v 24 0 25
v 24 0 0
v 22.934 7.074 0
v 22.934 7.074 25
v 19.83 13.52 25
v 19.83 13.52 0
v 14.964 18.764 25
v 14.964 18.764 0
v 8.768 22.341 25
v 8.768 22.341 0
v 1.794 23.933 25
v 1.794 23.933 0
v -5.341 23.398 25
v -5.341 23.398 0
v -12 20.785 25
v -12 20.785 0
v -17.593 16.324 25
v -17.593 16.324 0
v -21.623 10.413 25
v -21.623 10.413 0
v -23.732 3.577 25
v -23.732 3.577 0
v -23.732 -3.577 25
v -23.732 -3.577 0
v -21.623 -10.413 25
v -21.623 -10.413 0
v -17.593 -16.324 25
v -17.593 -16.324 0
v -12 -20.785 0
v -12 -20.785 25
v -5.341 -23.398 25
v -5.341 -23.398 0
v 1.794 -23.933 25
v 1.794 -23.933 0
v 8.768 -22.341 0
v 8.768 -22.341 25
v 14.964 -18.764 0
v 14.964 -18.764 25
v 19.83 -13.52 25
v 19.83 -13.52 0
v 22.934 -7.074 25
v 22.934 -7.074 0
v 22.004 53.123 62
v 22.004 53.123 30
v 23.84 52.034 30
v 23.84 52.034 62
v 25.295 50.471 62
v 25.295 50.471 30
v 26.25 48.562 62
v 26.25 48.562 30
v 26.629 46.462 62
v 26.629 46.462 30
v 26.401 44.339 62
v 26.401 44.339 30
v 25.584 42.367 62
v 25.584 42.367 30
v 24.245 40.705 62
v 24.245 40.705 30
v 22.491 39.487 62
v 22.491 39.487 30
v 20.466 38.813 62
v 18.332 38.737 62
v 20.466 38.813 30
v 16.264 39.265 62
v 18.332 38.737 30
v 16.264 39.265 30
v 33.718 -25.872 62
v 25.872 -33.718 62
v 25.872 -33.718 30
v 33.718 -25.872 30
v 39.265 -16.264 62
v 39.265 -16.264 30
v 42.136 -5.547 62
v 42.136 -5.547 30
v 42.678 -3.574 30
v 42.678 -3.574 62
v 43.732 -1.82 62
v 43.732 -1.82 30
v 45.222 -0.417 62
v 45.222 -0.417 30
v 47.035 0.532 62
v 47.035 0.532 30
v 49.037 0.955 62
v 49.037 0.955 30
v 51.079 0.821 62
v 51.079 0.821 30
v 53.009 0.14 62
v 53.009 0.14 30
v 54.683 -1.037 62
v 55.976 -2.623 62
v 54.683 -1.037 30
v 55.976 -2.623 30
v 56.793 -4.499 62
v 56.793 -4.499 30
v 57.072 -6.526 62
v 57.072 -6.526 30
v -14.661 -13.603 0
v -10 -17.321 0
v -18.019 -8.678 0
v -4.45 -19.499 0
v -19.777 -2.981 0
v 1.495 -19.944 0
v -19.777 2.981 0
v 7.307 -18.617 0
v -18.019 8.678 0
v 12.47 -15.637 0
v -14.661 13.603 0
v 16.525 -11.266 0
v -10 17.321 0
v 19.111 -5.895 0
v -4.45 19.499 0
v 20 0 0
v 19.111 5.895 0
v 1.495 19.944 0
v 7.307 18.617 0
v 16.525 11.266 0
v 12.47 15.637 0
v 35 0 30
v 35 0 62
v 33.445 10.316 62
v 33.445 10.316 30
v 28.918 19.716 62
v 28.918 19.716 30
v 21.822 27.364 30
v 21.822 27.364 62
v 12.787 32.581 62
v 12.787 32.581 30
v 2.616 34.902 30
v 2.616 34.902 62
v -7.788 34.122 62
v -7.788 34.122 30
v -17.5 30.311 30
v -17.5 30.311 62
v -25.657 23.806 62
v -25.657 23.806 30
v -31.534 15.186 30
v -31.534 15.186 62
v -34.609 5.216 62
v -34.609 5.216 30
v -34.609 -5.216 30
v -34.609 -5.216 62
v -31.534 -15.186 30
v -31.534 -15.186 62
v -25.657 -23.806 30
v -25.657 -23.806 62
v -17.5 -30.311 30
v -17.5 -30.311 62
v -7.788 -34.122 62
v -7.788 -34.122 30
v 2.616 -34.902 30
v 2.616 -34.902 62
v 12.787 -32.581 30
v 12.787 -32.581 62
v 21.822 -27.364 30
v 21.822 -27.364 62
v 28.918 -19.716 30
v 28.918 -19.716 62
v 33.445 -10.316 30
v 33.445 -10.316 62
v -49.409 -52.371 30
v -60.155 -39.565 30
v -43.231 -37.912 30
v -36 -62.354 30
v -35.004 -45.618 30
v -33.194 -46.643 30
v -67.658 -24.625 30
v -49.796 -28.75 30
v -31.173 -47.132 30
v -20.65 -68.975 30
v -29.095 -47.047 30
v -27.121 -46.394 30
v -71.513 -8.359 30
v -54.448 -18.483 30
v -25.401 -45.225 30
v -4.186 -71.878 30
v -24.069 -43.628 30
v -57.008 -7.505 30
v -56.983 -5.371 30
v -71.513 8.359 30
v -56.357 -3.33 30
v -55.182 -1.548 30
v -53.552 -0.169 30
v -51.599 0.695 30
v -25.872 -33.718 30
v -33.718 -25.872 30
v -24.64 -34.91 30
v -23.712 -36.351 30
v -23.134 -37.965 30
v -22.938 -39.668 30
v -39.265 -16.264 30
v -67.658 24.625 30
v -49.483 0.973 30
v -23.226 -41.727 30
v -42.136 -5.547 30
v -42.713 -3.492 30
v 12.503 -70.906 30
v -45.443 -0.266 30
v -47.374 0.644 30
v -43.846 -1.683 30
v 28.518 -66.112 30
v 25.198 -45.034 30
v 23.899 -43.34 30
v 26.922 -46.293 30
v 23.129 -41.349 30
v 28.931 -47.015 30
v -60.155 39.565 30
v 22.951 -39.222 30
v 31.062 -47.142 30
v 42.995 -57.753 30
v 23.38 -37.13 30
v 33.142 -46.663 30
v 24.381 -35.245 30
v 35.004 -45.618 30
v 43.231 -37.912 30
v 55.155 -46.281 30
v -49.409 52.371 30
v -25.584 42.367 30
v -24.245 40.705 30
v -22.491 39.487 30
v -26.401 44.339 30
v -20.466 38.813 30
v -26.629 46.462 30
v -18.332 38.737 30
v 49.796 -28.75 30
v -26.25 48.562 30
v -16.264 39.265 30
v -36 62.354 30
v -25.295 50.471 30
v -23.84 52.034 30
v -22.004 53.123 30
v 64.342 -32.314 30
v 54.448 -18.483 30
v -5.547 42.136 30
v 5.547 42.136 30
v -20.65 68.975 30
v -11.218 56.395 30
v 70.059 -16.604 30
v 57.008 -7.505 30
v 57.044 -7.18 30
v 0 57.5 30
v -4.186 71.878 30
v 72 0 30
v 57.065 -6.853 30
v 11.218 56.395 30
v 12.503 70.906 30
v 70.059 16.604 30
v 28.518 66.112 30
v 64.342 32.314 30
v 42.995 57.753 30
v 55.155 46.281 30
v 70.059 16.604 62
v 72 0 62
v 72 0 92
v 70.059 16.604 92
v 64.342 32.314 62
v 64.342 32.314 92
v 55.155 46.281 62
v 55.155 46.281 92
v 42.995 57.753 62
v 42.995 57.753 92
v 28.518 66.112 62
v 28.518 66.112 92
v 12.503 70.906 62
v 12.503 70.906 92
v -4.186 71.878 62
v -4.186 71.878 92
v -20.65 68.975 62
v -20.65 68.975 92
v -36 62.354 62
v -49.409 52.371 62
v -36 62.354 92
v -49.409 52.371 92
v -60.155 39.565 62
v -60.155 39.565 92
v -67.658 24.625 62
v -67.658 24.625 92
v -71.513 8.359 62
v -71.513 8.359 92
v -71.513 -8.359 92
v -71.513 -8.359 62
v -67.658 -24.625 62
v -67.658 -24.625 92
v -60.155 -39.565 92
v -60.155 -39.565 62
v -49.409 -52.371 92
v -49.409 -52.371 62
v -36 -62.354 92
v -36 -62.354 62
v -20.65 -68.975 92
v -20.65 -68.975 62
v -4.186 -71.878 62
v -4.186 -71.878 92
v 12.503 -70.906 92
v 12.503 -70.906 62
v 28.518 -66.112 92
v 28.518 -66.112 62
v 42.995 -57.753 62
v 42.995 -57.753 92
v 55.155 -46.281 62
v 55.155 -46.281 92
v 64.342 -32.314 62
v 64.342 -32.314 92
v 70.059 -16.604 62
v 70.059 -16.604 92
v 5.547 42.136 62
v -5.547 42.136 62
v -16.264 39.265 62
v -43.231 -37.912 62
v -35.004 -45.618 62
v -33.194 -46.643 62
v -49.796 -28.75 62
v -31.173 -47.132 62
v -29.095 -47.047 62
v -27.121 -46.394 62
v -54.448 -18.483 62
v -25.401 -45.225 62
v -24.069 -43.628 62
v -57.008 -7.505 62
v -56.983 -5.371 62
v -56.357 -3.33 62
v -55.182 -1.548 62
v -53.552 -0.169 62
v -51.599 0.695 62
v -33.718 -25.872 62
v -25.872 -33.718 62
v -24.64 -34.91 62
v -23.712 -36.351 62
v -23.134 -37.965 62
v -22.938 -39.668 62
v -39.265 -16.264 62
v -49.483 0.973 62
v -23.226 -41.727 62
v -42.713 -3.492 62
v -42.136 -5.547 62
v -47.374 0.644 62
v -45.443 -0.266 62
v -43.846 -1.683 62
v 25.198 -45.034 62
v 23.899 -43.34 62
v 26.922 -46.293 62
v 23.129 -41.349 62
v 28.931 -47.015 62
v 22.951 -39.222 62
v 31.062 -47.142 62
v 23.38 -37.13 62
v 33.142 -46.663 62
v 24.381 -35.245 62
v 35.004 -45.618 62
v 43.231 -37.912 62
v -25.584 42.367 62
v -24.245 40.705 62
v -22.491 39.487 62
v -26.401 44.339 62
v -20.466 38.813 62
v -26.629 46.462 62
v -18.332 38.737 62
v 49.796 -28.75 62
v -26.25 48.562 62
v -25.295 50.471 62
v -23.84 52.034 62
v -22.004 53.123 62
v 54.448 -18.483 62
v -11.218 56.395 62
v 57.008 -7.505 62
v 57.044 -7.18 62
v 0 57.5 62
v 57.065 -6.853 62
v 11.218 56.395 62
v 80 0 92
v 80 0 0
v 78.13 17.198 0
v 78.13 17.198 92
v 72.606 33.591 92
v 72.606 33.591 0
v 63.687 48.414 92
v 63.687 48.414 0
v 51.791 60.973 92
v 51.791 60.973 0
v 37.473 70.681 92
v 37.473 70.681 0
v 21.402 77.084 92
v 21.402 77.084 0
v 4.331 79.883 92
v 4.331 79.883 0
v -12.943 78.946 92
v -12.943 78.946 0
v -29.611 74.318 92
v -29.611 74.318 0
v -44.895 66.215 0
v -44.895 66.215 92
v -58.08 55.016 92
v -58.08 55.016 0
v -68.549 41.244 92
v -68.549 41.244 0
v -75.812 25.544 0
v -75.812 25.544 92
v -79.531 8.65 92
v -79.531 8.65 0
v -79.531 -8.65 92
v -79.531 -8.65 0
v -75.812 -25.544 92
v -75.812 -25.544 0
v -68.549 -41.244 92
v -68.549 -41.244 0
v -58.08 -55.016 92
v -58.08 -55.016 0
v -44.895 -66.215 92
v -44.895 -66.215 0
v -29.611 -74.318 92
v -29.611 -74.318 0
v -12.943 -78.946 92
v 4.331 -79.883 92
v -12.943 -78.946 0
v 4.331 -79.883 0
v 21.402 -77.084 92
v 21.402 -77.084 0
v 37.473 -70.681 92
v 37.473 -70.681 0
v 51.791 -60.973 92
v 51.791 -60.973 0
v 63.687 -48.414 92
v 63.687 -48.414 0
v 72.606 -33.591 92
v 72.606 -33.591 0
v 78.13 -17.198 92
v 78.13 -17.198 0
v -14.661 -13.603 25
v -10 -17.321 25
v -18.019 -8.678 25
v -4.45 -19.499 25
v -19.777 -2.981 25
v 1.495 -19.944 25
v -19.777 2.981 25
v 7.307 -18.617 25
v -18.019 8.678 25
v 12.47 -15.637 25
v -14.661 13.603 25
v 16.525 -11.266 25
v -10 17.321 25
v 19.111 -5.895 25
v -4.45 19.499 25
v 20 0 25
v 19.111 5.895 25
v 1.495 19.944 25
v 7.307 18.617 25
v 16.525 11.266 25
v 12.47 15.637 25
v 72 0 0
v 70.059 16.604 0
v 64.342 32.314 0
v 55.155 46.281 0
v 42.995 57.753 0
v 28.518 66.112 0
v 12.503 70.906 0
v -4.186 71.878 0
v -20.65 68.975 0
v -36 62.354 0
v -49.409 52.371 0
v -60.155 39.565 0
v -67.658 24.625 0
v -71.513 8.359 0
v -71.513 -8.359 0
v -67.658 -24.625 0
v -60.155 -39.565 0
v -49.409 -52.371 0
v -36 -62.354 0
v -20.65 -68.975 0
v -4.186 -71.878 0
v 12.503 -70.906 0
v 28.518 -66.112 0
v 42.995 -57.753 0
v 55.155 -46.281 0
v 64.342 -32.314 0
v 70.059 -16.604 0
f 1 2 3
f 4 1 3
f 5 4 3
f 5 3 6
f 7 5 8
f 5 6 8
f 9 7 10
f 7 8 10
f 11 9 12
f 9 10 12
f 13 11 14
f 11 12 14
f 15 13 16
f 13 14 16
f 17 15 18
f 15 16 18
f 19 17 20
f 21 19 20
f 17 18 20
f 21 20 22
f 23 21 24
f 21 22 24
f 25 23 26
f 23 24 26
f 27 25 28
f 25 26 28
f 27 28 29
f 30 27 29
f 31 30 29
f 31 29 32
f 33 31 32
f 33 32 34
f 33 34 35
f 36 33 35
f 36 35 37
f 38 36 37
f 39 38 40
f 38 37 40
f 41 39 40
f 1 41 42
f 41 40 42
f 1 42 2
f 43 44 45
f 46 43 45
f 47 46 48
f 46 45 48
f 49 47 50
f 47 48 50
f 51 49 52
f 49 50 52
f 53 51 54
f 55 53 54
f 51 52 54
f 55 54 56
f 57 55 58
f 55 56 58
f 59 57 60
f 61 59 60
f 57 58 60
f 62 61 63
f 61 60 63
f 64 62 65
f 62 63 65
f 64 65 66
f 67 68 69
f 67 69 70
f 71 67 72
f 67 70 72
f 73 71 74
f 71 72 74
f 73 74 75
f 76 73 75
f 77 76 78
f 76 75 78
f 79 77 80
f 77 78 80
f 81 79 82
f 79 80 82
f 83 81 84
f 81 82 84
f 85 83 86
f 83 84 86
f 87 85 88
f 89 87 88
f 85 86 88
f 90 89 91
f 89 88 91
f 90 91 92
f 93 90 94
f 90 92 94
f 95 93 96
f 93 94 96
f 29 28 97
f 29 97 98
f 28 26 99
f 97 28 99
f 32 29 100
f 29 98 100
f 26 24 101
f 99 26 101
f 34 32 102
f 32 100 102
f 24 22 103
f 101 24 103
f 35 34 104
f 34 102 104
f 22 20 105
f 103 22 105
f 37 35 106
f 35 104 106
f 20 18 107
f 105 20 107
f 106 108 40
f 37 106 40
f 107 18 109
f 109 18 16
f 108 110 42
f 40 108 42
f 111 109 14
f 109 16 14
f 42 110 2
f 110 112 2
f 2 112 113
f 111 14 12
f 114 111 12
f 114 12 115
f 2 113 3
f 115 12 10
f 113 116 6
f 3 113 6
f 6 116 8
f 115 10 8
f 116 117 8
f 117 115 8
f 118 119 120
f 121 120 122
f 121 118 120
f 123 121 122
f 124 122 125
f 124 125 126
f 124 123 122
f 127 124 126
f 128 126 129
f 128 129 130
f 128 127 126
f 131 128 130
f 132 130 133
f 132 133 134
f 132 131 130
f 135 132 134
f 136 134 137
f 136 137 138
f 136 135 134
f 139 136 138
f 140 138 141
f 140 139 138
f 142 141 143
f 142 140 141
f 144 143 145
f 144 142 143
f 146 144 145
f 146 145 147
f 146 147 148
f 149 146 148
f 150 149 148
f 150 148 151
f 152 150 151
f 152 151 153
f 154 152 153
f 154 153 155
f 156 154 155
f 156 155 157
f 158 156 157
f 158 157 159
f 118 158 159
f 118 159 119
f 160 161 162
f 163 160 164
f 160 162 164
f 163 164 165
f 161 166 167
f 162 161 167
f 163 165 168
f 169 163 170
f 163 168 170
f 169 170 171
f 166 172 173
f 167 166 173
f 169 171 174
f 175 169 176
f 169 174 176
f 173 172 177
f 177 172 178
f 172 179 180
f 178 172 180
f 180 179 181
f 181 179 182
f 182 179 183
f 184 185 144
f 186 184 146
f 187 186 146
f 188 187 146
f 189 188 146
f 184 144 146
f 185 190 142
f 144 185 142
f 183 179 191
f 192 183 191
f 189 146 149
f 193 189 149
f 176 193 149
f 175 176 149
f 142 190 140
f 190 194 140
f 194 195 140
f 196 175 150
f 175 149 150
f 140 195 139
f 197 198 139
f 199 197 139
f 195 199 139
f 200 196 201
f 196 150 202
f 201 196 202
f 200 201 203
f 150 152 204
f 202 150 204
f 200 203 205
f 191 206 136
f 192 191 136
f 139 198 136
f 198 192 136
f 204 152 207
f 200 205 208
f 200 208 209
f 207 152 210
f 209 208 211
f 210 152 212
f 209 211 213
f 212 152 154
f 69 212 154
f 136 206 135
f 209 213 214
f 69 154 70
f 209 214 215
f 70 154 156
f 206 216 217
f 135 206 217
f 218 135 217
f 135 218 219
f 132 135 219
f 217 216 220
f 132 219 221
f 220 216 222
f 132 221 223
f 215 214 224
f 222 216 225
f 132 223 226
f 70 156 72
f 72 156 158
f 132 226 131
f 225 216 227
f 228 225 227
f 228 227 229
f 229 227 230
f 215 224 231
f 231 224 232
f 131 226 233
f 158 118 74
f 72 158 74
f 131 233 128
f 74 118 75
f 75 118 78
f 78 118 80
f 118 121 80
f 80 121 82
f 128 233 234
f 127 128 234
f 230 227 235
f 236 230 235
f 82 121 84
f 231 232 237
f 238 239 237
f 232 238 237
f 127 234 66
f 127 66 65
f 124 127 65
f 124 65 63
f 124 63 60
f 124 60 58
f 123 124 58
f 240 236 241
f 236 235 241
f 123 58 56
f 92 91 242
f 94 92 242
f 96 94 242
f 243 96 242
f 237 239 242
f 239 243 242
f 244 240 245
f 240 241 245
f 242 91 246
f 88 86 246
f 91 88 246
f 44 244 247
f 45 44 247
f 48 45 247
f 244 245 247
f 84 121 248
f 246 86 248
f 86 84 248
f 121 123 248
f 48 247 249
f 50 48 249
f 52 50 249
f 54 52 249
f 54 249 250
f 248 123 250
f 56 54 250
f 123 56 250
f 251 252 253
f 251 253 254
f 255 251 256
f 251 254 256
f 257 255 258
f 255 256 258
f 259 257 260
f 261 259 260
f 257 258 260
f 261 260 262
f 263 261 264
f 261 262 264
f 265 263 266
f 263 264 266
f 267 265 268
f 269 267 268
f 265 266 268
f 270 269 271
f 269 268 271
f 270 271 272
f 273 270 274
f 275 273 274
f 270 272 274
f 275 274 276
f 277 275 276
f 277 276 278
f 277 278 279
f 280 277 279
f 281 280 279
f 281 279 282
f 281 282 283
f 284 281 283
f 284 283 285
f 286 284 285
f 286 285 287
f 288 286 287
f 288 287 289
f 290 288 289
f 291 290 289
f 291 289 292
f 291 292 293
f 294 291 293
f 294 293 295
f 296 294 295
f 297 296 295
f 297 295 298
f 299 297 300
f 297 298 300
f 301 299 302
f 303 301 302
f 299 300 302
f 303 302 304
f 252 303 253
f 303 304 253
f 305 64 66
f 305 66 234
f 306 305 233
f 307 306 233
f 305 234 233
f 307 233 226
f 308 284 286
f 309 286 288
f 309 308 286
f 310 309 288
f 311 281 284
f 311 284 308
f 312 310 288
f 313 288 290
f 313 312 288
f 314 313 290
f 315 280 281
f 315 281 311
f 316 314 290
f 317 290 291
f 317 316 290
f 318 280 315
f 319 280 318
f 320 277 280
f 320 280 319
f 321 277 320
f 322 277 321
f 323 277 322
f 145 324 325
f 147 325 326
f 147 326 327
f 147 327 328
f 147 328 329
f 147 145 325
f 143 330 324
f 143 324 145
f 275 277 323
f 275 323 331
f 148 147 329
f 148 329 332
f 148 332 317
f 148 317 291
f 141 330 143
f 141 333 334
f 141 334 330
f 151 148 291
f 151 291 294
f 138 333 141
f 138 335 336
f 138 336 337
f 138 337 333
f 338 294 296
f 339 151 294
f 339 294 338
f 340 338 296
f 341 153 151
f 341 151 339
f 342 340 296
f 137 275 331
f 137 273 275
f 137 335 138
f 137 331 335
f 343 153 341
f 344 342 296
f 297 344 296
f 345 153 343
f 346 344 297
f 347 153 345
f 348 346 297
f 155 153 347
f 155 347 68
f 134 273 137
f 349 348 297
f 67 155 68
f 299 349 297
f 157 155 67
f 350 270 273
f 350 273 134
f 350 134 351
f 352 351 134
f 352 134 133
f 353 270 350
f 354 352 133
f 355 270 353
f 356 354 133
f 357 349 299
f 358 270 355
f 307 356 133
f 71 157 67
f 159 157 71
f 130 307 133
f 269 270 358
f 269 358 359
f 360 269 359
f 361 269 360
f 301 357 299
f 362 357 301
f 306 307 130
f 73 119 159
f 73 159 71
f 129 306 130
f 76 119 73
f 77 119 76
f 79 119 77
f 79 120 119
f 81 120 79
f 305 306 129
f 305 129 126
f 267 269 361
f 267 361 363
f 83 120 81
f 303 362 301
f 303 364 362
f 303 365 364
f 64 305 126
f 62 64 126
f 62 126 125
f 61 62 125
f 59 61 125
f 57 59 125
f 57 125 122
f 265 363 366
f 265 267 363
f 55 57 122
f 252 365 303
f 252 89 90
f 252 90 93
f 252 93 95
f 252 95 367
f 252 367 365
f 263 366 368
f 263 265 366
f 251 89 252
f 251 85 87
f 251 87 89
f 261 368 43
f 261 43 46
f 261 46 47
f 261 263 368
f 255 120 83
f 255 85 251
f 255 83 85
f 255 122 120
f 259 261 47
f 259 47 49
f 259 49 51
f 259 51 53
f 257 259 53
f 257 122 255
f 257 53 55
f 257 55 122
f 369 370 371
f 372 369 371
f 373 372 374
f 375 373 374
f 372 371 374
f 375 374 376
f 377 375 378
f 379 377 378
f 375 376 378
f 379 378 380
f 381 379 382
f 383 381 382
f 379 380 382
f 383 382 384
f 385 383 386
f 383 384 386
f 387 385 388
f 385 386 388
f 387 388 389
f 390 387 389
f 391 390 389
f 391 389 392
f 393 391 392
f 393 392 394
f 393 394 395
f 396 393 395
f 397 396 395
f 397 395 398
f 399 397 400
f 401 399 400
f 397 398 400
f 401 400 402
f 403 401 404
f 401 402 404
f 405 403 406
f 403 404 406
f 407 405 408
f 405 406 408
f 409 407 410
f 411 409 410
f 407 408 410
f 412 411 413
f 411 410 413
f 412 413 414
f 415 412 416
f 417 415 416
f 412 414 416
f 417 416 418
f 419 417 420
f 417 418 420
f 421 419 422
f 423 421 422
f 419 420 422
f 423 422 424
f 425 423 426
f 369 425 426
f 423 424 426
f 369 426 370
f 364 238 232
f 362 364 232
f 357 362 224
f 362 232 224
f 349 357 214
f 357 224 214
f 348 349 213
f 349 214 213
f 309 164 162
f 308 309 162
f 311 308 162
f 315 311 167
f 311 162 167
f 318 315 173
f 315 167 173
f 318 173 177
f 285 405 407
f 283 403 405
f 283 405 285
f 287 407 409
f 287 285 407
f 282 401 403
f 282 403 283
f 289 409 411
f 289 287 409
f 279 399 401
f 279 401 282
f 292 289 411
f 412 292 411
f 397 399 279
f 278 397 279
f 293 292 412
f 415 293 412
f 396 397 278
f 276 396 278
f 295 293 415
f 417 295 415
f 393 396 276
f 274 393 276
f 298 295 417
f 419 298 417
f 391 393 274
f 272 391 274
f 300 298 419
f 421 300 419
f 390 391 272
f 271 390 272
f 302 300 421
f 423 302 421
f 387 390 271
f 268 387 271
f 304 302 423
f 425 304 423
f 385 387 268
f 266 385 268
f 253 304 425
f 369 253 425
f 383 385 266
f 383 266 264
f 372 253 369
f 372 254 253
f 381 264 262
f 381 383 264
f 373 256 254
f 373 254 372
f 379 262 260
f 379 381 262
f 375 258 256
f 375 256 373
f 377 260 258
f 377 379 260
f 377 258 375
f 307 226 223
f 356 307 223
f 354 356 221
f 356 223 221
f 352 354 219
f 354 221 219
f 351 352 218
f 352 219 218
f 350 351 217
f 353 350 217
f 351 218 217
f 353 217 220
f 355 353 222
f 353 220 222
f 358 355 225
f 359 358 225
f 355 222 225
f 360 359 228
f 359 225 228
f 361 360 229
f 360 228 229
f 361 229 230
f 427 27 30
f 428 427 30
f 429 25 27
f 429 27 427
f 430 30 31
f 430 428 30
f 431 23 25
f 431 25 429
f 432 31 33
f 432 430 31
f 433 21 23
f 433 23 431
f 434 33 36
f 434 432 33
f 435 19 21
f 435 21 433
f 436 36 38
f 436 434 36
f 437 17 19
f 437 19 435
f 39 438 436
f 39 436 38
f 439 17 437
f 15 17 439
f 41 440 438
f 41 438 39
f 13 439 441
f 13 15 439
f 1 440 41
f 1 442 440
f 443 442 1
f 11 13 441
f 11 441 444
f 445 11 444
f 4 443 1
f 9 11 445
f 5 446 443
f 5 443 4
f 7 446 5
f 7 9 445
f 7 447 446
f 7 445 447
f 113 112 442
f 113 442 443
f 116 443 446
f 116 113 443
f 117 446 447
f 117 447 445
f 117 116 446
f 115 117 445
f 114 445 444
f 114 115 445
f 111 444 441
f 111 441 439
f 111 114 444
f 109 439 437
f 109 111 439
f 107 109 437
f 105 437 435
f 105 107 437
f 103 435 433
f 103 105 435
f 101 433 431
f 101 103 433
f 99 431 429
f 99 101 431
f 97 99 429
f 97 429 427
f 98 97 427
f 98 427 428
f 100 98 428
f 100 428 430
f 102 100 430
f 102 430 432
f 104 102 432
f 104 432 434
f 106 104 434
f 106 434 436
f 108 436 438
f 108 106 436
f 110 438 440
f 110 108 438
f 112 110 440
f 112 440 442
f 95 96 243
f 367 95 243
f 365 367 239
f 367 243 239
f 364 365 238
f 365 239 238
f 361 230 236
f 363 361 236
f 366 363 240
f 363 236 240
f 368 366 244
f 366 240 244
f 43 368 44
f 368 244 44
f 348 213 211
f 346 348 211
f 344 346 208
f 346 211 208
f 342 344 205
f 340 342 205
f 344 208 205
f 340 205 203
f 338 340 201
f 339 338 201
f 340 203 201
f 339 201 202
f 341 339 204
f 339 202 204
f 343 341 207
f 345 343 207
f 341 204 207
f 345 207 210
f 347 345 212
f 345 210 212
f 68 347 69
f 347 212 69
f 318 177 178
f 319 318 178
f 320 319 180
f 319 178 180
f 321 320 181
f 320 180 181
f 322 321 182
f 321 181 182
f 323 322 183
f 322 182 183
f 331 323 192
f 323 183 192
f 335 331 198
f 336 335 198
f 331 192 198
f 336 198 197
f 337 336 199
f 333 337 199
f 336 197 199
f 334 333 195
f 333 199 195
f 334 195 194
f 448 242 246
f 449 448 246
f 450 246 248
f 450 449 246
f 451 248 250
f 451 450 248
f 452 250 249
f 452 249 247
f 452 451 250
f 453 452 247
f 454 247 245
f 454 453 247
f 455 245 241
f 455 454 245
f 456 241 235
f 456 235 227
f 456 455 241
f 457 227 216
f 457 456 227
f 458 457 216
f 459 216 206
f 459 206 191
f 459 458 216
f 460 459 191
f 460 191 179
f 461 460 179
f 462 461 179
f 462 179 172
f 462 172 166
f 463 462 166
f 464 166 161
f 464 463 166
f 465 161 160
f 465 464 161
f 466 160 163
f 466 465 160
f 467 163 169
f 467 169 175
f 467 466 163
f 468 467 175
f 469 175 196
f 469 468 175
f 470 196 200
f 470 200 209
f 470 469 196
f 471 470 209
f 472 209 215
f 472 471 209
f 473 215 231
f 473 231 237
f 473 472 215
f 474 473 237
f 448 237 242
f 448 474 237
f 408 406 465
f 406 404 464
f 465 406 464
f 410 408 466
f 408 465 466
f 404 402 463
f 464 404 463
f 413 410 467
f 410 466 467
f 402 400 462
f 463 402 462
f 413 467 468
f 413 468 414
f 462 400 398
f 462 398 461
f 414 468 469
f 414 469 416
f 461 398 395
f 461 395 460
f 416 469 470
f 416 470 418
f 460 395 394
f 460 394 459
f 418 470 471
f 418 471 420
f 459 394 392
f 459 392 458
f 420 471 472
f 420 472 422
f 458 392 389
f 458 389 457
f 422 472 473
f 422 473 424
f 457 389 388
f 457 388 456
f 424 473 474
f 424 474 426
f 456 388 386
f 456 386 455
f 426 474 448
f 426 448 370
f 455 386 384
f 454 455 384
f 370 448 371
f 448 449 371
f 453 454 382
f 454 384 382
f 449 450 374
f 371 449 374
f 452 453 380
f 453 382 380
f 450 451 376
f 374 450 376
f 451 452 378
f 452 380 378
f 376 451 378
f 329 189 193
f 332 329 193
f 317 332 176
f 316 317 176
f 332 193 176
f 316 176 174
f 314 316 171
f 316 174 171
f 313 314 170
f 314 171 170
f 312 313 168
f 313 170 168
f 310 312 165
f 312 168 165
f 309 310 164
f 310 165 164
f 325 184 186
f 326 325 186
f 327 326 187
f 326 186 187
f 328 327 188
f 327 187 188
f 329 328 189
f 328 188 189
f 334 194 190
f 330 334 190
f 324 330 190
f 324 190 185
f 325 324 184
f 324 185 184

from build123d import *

# Parameters (mm, degrees)
F0_R      = 80
F0_R_2    = 72
F1_DEPTH  = 92
F0_R_3    = 35
F2_DEPTH  = 92
F3_DEPTH  = 30
F4_R      = 72
F4_R_2    = 35
F5_DEPTH  = 30
F6_R      = 72
F6_R_2    = 35
F7_DEPTH  = 25
F8_DEPTH  = 30
F9_R      = 24
F9_R_2    = 20
F10_DEPTH = 25


with BuildPart() as f1:
    # F0 (on Top) → F1 (new body)
    with BuildSketch(Plane.XY):
        Circle(F0_R)
        Circle(F0_R_2, mode=Mode.SUBTRACT)
    extrude(amount=F1_DEPTH)

    # F0 (on Top) → F2 (join)
    with BuildSketch(Plane.XY):
        Circle(F0_R)
        Circle(F0_R_2, mode=Mode.SUBTRACT)
        Circle(F0_R_2)
        with BuildLine():
            ThreePointArc((-25.872361, -33.717517), (-23.711526, -36.350502), (-22.938071, -39.667667))
            ThreePointArc((-22.938071, -39.667667), (-27.120906, -46.394213), (-35.003782, -45.617817))
            ThreePointArc((-35.003782, -45.617817), (-49.796461, -28.75), (-57.00808, -7.505256))
            ThreePointArc((-57.00808, -7.505256), (-50.55119, 0.909527), (-42.136407, -5.547363))
            ThreePointArc((-42.136407, -5.547363), (-36.80608, -21.25), (-25.872361, -33.717517))
        make_face(mode=Mode.SUBTRACT)
        with BuildLine():
            ThreePointArc((42.136407, -5.547363), (50.062767, 0.957632), (57.072243, -6.52631))
            ThreePointArc((57.072243, -6.52631), (57.056185, -7.016833), (57.00808, -7.505256))
            ThreePointArc((57.00808, -7.505256), (49.796461, -28.75), (35.003782, -45.617817))
            ThreePointArc((35.003782, -45.617817), (24.487921, -44.233378), (25.872361, -33.717517))
            ThreePointArc((25.872361, -33.717517), (36.80608, -21.25), (42.136407, -5.547363))
        make_face(mode=Mode.SUBTRACT)
        with BuildLine():
            ThreePointArc((-16.264046, 39.26488), (-26.063268, 43.323851), (-22.004297, 53.123073))
            ThreePointArc((-22.004297, 53.123073), (0, 57.5), (22.004297, 53.123073))
            ThreePointArc((22.004297, 53.123073), (26.063268, 43.323851), (16.264046, 39.26488))
            ThreePointArc((16.264046, 39.26488), (0, 42.5), (-16.264046, 39.26488))
        make_face(mode=Mode.SUBTRACT)
        Circle(F0_R_3, mode=Mode.SUBTRACT)
    extrude(amount=F2_DEPTH)

    # F0 (on Top) → F3 (cut)
    with BuildSketch(Plane.XY):
        Circle(F0_R_2)
        with BuildLine():
            ThreePointArc((-25.872361, -33.717517), (-23.711526, -36.350502), (-22.938071, -39.667667))
            ThreePointArc((-22.938071, -39.667667), (-27.120906, -46.394213), (-35.003782, -45.617817))
            ThreePointArc((-35.003782, -45.617817), (-49.796461, -28.75), (-57.00808, -7.505256))
            ThreePointArc((-57.00808, -7.505256), (-50.55119, 0.909527), (-42.136407, -5.547363))
            ThreePointArc((-42.136407, -5.547363), (-36.80608, -21.25), (-25.872361, -33.717517))
        make_face(mode=Mode.SUBTRACT)
        with BuildLine():
            ThreePointArc((42.136407, -5.547363), (50.062767, 0.957632), (57.072243, -6.52631))
            ThreePointArc((57.072243, -6.52631), (57.056185, -7.016833), (57.00808, -7.505256))
            ThreePointArc((57.00808, -7.505256), (49.796461, -28.75), (35.003782, -45.617817))
            ThreePointArc((35.003782, -45.617817), (24.487921, -44.233378), (25.872361, -33.717517))
            ThreePointArc((25.872361, -33.717517), (36.80608, -21.25), (42.136407, -5.547363))
        make_face(mode=Mode.SUBTRACT)
        with BuildLine():
            ThreePointArc((-16.264046, 39.26488), (-26.063268, 43.323851), (-22.004297, 53.123073))
            ThreePointArc((-22.004297, 53.123073), (0, 57.5), (22.004297, 53.123073))
            ThreePointArc((22.004297, 53.123073), (26.063268, 43.323851), (16.264046, 39.26488))
            ThreePointArc((16.264046, 39.26488), (0, 42.5), (-16.264046, 39.26488))
        make_face(mode=Mode.SUBTRACT)
        Circle(F0_R_3, mode=Mode.SUBTRACT)
    extrude(amount=F3_DEPTH, mode=Mode.SUBTRACT)

    # F4 (on face) → F5 (cut)
    with BuildSketch(Plane.XY):
        Circle(F4_R)
        with BuildLine():
            ThreePointArc((-57.00808, -7.505256), (-50.55119, 0.909527), (-42.136407, -5.547363))
            ThreePointArc((-42.136407, -5.547363), (-36.80608, -21.25), (-25.872361, -33.717517))
            ThreePointArc((-25.872361, -33.717517), (-23.711526, -36.350502), (-22.938071, -39.667667))
            ThreePointArc((-22.938071, -39.667667), (-27.120906, -46.394213), (-35.003782, -45.617817))
            ThreePointArc((-35.003782, -45.617817), (-49.796461, -28.75), (-57.00808, -7.505256))
        make_face(mode=Mode.SUBTRACT)
        with BuildLine():
            ThreePointArc((35.003782, -45.617817), (24.487921, -44.233378), (25.872361, -33.717517))
            ThreePointArc((25.872361, -33.717517), (36.80608, -21.25), (42.136407, -5.547363))
            ThreePointArc((42.136407, -5.547363), (50.062767, 0.957632), (57.072243, -6.52631))
            ThreePointArc((57.072243, -6.52631), (57.056185, -7.016833), (57.00808, -7.505256))
            ThreePointArc((57.00808, -7.505256), (49.796461, -28.75), (35.003782, -45.617817))
        make_face(mode=Mode.SUBTRACT)
        with BuildLine():
            ThreePointArc((22.004297, 53.123073), (26.063268, 43.323851), (16.264046, 39.26488))
            ThreePointArc((16.264046, 39.26488), (0, 42.5), (-16.264046, 39.26488))
            ThreePointArc((-16.264046, 39.26488), (-26.063268, 43.323851), (-22.004297, 53.123073))
            ThreePointArc((-22.004297, 53.123073), (0, 57.5), (22.004297, 53.123073))
        make_face(mode=Mode.SUBTRACT)
        Circle(F4_R_2, mode=Mode.SUBTRACT)
    extrude(amount=F5_DEPTH, mode=Mode.SUBTRACT)

    # F6 (on face) → F7 (cut)
    with BuildSketch(Plane.XY.offset(92)):
        Circle(F6_R)
        with BuildLine():
            ThreePointArc((-57.00808, -7.505256), (-50.55119, 0.909527), (-42.136407, -5.547363))
            ThreePointArc((-42.136407, -5.547363), (-36.80608, -21.25), (-25.872361, -33.717517))
            ThreePointArc((-25.872361, -33.717517), (-23.711526, -36.350502), (-22.938071, -39.667667))
            ThreePointArc((-22.938071, -39.667667), (-27.120906, -46.394213), (-35.003782, -45.617817))
            ThreePointArc((-35.003782, -45.617817), (-49.796461, -28.75), (-57.00808, -7.505256))
        make_face(mode=Mode.SUBTRACT)
        with BuildLine():
            ThreePointArc((35.003782, -45.617817), (24.487921, -44.233378), (25.872361, -33.717517))
            ThreePointArc((25.872361, -33.717517), (36.80608, -21.25), (42.136407, -5.547363))
            ThreePointArc((42.136407, -5.547363), (50.062767, 0.957632), (57.072243, -6.52631))
            ThreePointArc((57.072243, -6.52631), (57.056185, -7.016833), (57.00808, -7.505256))
            ThreePointArc((57.00808, -7.505256), (49.796461, -28.75), (35.003782, -45.617817))
        make_face(mode=Mode.SUBTRACT)
        with BuildLine():
            ThreePointArc((-22.004297, 53.123073), (0, 57.5), (22.004297, 53.123073))
            ThreePointArc((22.004297, 53.123073), (26.063268, 43.323851), (16.264046, 39.26488))
            ThreePointArc((16.264046, 39.26488), (0, 42.5), (-16.264046, 39.26488))
            ThreePointArc((-16.264046, 39.26488), (-26.063268, 43.323851), (-22.004297, 53.123073))
        make_face(mode=Mode.SUBTRACT)
        Circle(F6_R_2, mode=Mode.SUBTRACT)
    extrude(amount=-F7_DEPTH, mode=Mode.SUBTRACT)

    # F6 (on face) → F8 (cut)
    with BuildSketch(Plane.XY.offset(92)):
        Circle(F6_R)
        with BuildLine():
            ThreePointArc((-57.00808, -7.505256), (-50.55119, 0.909527), (-42.136407, -5.547363))
            ThreePointArc((-42.136407, -5.547363), (-36.80608, -21.25), (-25.872361, -33.717517))
            ThreePointArc((-25.872361, -33.717517), (-23.711526, -36.350502), (-22.938071, -39.667667))
            ThreePointArc((-22.938071, -39.667667), (-27.120906, -46.394213), (-35.003782, -45.617817))
            ThreePointArc((-35.003782, -45.617817), (-49.796461, -28.75), (-57.00808, -7.505256))
        make_face(mode=Mode.SUBTRACT)
        with BuildLine():
            ThreePointArc((35.003782, -45.617817), (24.487921, -44.233378), (25.872361, -33.717517))
            ThreePointArc((25.872361, -33.717517), (36.80608, -21.25), (42.136407, -5.547363))
            ThreePointArc((42.136407, -5.547363), (50.062767, 0.957632), (57.072243, -6.52631))
            ThreePointArc((57.072243, -6.52631), (57.056185, -7.016833), (57.00808, -7.505256))
            ThreePointArc((57.00808, -7.505256), (49.796461, -28.75), (35.003782, -45.617817))
        make_face(mode=Mode.SUBTRACT)
        with BuildLine():
            ThreePointArc((-22.004297, 53.123073), (0, 57.5), (22.004297, 53.123073))
            ThreePointArc((22.004297, 53.123073), (26.063268, 43.323851), (16.264046, 39.26488))
            ThreePointArc((16.264046, 39.26488), (0, 42.5), (-16.264046, 39.26488))
            ThreePointArc((-16.264046, 39.26488), (-26.063268, 43.323851), (-22.004297, 53.123073))
        make_face(mode=Mode.SUBTRACT)
        Circle(F6_R_2, mode=Mode.SUBTRACT)
    extrude(amount=-F8_DEPTH, mode=Mode.SUBTRACT)


with BuildPart() as f10:
    # F9 (on face) → F10 (new body)
    with BuildSketch(Plane.XY):
        Circle(F9_R)
        Circle(F9_R_2, mode=Mode.SUBTRACT)
    extrude(amount=F10_DEPTH)


solid = Compound([f1.part, f10.part])
